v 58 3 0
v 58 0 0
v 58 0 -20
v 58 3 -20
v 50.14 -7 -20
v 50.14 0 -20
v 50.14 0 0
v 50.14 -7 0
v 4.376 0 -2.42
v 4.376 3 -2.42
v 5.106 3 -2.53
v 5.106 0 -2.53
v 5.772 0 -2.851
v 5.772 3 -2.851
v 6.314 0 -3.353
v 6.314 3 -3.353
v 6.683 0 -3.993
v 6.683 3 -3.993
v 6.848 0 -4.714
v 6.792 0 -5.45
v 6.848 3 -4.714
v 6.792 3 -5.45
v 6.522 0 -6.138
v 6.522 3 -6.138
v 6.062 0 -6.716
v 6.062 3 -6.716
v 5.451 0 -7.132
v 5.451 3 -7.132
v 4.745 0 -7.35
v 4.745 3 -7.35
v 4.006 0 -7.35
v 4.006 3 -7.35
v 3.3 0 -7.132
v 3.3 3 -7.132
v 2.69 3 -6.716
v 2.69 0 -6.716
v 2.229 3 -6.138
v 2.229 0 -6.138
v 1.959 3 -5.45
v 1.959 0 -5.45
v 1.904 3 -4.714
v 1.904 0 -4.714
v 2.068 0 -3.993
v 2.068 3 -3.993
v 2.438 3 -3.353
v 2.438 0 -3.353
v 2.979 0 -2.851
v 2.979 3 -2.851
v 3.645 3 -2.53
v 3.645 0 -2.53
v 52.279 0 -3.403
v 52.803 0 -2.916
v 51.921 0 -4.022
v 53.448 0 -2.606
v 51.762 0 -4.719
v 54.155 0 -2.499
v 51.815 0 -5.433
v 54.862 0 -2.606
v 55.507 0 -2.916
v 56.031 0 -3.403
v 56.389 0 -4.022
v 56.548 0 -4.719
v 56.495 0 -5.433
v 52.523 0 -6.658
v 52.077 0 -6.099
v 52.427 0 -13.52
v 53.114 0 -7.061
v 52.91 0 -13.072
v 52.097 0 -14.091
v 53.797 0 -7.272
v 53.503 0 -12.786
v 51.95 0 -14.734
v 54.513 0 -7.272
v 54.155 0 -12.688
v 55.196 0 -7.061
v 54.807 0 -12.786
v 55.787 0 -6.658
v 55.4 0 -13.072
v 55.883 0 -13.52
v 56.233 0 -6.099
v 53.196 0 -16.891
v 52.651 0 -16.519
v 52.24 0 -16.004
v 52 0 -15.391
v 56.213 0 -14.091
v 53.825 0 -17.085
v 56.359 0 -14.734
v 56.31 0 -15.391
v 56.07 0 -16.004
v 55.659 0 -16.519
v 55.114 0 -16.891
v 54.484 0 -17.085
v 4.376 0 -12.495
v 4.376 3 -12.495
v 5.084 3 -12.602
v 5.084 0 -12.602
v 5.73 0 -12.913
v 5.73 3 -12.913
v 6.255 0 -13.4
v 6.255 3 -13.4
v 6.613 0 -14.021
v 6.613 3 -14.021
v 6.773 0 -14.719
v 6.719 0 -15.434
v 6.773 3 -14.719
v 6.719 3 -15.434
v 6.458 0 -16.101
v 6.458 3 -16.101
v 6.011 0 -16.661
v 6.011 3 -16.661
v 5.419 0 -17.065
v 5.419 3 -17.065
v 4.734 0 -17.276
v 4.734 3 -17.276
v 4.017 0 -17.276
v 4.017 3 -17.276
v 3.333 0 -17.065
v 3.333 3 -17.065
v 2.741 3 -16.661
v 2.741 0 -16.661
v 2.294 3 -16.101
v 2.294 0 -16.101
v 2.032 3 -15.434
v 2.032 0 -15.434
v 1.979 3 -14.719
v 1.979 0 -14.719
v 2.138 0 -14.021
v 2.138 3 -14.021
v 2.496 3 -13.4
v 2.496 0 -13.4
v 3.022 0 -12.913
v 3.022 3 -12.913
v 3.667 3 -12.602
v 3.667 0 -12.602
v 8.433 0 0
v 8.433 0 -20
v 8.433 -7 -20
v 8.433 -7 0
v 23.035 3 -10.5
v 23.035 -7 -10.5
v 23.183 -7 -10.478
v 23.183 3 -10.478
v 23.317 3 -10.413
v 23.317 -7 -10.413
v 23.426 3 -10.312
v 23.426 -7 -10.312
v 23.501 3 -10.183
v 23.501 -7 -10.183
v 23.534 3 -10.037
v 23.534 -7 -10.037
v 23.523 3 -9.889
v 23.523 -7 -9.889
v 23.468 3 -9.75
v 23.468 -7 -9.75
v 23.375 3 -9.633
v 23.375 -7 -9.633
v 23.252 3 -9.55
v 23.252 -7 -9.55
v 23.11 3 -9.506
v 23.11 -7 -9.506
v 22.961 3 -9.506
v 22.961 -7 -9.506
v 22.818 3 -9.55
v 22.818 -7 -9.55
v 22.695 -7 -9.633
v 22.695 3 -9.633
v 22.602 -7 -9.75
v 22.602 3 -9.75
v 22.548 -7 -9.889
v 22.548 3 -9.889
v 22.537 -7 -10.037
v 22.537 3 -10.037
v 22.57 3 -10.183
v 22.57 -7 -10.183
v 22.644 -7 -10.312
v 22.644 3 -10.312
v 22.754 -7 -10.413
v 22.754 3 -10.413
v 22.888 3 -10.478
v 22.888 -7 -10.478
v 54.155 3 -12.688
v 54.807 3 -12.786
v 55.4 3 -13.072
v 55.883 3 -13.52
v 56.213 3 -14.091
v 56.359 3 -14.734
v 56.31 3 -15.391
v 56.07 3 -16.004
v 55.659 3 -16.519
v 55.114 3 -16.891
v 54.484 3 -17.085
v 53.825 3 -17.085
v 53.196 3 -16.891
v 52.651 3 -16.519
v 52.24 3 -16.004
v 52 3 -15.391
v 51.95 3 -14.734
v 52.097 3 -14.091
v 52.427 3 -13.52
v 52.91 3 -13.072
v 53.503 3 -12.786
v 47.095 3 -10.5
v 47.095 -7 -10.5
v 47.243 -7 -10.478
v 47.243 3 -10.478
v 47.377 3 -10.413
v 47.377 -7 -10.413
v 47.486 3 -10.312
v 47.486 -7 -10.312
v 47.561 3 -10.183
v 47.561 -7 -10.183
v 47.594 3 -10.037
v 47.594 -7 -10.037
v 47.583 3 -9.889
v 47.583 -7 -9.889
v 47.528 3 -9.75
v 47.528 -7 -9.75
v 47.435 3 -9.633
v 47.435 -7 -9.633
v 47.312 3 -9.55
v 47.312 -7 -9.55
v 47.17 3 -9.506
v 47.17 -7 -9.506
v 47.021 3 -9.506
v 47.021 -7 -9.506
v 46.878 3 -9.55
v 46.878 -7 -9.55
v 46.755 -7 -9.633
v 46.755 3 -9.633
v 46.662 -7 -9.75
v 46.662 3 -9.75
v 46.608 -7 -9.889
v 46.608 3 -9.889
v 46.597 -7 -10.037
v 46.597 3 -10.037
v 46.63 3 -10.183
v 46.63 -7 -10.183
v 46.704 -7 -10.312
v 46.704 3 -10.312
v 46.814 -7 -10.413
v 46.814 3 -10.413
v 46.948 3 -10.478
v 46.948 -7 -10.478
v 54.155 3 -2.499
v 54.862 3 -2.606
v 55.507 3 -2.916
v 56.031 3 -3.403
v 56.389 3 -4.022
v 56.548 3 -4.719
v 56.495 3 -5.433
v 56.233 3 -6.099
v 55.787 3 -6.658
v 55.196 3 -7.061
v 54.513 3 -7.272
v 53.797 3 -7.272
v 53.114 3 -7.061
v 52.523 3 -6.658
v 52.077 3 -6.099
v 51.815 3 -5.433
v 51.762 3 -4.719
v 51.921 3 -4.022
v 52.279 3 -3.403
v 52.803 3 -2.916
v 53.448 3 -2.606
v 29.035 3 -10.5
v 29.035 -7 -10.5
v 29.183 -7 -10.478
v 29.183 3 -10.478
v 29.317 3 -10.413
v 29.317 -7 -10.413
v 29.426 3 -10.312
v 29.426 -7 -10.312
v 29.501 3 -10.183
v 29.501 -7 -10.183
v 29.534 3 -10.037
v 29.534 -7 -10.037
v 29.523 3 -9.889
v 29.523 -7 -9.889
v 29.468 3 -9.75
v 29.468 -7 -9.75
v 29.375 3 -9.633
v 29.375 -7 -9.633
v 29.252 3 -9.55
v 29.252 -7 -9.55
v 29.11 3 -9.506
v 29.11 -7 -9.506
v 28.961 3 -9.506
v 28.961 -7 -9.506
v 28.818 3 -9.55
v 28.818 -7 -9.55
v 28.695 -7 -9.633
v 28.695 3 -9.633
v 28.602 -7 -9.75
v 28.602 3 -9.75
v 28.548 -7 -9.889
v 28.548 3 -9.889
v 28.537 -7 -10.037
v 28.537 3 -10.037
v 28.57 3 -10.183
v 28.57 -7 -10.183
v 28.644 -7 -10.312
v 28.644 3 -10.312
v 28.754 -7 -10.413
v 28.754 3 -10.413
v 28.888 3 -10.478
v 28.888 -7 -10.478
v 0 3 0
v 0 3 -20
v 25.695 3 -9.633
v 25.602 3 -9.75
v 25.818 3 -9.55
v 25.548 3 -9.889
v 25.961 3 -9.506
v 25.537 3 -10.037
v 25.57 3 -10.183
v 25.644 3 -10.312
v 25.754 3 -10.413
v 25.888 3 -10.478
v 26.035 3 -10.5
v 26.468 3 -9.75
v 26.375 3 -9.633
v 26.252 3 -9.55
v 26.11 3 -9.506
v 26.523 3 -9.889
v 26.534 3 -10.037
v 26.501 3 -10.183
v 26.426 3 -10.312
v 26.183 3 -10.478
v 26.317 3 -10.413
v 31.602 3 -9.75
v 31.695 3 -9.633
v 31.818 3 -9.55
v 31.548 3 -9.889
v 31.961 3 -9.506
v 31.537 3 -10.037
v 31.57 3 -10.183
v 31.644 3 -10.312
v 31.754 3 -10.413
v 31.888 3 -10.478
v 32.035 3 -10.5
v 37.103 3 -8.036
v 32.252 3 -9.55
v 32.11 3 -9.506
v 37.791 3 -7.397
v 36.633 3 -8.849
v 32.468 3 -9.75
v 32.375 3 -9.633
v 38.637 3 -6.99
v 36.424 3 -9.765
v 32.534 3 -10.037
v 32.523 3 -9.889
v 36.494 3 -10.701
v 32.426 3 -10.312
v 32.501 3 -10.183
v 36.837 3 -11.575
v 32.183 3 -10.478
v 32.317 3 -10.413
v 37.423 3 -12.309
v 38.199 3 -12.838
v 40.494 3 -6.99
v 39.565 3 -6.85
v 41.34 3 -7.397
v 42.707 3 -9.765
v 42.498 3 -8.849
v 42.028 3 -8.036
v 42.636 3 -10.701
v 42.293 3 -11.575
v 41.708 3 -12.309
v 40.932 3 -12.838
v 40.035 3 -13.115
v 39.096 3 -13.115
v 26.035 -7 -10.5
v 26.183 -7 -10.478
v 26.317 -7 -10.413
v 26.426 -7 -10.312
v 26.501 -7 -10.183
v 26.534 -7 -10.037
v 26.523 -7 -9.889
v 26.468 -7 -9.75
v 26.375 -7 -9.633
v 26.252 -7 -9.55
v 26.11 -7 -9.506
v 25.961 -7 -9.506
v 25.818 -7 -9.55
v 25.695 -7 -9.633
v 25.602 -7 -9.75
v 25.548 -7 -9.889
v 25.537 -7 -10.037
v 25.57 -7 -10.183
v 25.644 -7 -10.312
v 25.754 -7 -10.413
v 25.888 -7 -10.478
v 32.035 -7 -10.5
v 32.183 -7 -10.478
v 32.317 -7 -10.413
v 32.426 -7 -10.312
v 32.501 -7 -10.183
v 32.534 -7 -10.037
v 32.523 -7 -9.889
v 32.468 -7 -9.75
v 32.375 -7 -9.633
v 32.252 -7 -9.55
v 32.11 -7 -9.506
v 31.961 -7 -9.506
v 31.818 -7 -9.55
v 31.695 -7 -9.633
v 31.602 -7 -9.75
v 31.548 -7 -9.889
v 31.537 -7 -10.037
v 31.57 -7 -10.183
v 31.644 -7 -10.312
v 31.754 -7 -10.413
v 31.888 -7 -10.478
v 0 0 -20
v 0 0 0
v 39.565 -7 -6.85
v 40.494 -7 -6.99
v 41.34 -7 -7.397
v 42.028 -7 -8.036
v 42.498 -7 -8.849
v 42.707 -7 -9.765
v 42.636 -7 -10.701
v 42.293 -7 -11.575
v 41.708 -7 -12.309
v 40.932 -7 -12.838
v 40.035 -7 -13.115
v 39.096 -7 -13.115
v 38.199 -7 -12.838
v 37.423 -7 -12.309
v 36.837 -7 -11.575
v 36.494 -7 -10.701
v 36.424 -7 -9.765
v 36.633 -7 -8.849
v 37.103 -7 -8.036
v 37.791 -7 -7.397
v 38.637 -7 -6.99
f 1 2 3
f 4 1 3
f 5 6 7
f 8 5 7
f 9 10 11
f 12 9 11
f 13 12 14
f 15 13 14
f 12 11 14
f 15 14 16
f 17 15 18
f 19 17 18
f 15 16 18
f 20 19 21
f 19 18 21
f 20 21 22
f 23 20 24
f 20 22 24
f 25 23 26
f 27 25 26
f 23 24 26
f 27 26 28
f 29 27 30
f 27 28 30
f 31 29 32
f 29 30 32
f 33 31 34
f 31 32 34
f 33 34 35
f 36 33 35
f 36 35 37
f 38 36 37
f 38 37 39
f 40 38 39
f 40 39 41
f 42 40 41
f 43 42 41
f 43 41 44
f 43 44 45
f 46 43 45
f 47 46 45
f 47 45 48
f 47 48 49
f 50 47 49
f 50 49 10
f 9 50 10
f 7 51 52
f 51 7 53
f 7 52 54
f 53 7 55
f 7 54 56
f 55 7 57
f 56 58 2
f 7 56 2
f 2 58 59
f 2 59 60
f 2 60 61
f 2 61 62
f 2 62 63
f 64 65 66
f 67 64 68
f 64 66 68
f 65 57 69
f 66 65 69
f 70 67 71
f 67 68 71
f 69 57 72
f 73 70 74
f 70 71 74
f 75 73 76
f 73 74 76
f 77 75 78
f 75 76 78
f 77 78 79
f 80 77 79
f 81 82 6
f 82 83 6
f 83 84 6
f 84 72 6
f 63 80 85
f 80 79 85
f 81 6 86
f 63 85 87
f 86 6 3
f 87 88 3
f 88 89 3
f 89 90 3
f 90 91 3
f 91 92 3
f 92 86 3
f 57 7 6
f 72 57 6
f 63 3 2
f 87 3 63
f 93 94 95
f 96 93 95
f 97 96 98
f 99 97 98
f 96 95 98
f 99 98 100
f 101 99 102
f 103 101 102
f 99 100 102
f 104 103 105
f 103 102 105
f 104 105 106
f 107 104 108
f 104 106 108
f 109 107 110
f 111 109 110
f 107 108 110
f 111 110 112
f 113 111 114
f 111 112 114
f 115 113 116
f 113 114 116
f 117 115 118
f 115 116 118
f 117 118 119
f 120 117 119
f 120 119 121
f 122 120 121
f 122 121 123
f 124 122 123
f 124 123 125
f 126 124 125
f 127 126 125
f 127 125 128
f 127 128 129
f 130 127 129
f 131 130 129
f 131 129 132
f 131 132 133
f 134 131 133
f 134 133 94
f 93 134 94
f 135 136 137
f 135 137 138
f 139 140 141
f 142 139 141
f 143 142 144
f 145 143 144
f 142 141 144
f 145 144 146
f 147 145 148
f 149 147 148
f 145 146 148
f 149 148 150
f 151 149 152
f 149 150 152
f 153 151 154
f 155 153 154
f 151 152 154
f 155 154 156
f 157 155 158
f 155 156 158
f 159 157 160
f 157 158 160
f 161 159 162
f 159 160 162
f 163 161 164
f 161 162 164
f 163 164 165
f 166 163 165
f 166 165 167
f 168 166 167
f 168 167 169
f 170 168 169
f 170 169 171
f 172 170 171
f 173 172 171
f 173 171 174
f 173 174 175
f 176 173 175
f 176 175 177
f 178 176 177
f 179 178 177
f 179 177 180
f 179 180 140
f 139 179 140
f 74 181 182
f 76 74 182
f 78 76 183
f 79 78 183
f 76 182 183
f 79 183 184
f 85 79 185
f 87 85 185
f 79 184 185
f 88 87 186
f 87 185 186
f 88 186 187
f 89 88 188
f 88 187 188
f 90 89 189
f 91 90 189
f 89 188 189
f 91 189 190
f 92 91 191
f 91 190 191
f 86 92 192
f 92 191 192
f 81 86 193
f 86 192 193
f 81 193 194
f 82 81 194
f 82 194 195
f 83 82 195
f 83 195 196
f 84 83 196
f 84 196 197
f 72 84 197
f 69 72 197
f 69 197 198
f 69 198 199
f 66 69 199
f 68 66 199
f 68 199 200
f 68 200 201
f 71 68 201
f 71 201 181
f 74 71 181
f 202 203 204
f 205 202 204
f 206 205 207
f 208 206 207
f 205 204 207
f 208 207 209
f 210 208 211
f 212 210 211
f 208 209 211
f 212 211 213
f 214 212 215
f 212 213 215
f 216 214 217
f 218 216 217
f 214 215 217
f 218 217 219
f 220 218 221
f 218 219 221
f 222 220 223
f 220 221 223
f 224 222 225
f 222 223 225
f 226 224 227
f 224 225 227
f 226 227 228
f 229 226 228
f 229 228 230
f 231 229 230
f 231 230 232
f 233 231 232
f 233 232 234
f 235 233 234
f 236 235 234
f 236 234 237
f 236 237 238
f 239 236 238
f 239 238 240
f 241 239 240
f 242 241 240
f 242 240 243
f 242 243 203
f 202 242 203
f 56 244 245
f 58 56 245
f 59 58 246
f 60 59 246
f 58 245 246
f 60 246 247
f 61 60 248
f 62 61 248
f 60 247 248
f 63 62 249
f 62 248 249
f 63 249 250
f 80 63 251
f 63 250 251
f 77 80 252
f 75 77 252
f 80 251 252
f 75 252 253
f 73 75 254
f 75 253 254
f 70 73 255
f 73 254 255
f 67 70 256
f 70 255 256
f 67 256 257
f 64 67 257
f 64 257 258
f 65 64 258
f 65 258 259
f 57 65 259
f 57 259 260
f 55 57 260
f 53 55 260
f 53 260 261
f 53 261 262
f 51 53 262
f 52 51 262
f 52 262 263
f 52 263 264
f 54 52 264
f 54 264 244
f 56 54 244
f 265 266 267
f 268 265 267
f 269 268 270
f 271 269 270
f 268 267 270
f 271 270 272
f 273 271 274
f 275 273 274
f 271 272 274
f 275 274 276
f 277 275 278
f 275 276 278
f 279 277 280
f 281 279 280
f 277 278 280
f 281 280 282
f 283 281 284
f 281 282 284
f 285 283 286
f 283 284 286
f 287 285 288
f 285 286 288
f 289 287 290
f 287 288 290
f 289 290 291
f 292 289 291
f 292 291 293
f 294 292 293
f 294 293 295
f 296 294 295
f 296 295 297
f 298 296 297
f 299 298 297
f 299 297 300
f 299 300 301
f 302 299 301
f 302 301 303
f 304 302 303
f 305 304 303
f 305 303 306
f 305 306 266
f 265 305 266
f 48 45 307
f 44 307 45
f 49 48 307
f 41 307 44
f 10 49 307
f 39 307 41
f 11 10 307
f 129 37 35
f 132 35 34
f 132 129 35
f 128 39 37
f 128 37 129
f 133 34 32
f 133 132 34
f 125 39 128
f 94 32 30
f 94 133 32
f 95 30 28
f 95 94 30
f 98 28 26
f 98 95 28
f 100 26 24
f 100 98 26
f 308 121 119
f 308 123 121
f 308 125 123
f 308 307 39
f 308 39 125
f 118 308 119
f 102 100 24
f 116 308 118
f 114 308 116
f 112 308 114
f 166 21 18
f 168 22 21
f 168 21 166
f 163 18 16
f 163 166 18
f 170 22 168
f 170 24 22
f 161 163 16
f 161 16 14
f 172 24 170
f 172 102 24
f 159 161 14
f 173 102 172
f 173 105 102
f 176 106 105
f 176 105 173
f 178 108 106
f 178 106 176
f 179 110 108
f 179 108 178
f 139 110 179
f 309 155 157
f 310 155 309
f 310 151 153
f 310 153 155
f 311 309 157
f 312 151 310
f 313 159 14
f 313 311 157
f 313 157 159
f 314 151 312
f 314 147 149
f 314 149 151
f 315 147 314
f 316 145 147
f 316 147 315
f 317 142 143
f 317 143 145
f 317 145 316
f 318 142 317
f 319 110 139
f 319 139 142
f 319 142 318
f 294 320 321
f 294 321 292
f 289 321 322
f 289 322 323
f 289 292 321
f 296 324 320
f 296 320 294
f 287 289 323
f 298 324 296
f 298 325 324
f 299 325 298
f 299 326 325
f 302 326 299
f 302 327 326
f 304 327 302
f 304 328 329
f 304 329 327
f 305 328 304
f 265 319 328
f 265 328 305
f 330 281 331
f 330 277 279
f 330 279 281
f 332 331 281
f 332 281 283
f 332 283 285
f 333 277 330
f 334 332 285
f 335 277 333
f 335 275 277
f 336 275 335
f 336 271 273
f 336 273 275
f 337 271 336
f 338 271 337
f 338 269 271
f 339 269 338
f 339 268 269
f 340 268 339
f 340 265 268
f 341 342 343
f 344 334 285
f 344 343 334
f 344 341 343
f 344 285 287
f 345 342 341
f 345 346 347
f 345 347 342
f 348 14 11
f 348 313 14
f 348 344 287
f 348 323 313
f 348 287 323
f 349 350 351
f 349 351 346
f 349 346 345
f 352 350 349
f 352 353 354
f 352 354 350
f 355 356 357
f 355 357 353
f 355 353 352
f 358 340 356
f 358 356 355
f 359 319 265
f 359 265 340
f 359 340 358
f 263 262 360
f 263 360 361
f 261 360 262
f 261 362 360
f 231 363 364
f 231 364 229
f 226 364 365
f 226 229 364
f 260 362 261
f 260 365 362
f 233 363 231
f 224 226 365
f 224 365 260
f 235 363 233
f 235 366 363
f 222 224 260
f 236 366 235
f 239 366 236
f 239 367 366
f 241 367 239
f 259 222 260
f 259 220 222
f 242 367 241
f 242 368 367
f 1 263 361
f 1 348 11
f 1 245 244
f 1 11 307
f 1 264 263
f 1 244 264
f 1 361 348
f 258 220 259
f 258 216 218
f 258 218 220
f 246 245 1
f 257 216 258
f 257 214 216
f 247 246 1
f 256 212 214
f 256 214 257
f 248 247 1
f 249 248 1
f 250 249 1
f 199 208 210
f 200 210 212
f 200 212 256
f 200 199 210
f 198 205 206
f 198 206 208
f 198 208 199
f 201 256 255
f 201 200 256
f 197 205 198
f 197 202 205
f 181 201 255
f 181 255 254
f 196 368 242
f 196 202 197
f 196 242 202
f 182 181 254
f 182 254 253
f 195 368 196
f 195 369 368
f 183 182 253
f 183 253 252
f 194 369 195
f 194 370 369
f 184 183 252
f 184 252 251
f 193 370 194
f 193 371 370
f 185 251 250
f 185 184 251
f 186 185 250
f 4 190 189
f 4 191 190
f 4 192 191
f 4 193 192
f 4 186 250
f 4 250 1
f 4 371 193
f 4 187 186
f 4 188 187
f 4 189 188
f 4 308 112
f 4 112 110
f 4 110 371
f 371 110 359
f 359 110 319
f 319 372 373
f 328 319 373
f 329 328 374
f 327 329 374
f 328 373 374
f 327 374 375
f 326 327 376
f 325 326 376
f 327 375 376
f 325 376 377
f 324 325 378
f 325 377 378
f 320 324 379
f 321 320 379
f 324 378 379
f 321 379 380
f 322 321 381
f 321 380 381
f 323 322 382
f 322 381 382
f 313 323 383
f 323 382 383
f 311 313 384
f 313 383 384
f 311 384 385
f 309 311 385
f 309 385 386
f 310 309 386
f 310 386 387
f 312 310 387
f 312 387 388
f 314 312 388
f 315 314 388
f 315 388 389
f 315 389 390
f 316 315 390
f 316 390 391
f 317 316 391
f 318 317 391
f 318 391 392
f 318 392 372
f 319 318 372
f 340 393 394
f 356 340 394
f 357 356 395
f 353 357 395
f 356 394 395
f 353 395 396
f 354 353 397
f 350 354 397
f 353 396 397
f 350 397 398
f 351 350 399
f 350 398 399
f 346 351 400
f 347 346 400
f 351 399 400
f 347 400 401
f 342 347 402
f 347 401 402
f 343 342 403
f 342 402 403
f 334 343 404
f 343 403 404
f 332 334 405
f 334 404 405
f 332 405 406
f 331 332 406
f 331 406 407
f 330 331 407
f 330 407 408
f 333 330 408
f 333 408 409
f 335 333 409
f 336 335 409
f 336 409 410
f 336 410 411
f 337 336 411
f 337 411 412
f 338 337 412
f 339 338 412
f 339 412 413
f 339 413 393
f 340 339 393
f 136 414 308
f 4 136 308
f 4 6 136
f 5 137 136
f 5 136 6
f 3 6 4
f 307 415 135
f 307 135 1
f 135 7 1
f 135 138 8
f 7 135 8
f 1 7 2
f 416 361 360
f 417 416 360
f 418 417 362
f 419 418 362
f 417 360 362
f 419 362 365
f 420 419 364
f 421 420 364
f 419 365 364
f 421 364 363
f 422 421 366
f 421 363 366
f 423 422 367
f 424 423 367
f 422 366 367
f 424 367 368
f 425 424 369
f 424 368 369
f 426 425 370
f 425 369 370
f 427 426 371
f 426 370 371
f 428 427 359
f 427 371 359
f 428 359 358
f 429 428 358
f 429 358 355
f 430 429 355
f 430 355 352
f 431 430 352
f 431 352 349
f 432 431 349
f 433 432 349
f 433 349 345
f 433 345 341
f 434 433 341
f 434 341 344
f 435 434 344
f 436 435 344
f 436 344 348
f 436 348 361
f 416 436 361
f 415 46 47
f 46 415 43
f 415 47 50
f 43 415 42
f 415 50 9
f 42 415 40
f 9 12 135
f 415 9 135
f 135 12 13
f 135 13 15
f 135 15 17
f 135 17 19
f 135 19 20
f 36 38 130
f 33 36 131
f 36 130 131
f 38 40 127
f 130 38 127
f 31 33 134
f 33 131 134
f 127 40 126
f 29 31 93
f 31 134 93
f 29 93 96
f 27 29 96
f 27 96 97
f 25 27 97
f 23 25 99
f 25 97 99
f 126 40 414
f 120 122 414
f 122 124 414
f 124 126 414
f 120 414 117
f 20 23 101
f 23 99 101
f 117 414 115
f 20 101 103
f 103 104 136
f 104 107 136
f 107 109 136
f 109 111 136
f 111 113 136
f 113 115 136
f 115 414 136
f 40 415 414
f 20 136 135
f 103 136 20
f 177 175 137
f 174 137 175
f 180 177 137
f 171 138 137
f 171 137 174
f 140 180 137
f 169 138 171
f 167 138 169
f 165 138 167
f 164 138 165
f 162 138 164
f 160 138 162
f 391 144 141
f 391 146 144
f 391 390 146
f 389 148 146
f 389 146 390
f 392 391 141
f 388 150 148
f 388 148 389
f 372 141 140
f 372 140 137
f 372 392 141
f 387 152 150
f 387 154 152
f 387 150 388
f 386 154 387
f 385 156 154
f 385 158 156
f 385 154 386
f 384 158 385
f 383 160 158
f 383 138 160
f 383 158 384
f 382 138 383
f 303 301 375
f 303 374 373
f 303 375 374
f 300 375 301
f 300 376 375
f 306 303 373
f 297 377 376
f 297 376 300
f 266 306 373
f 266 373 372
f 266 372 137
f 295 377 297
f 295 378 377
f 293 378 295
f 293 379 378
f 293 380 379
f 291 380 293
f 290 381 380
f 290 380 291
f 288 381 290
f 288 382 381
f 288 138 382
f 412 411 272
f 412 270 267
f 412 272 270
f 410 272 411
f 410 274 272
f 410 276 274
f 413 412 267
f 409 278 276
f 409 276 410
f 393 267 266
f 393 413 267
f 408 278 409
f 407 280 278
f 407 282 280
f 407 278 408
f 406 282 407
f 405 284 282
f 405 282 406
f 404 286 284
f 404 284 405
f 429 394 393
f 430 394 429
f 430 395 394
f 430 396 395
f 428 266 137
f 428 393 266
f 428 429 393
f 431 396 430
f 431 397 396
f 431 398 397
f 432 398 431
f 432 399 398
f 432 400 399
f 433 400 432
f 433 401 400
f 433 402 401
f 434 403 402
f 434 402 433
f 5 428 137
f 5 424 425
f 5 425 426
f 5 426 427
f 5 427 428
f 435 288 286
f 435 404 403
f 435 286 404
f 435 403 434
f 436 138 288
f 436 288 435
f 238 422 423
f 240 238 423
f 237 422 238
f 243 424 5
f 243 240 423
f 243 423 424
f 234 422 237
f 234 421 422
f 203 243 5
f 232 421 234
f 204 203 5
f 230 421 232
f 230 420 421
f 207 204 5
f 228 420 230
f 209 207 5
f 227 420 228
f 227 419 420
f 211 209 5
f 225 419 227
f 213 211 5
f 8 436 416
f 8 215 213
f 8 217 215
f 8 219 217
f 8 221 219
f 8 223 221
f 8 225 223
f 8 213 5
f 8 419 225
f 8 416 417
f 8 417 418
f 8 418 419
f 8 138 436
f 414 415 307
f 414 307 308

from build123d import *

# Parameters (mm, degrees)
SKETCH1_W           = 58
SKETCH1_H           = 20
BOSS_EXTRUDE1_DEPTH = 3
SKETCH2_R           = 2.210718461
SKETCH2_R_2         = 2.399764385
SKETCH2_R_3         = 2.478849081
SKETCH2_R_4         = 2.403854655
CUT_EXTRUDE1_DEPTH  = 10
SKETCH3_W           = 41.706821958
SKETCH3_H           = 20
BOSS_EXTRUDE2_DEPTH = 7
SKETCH4_R           = 3.15
CUT_EXTRUDE2_DEPTH  = 20
SKETCH5_R           = 0.5
CUT_EXTRUDE3_DEPTH  = 22


with BuildPart() as part:
    # Sketch1 → Boss-Extrude1 (new body)
    with BuildSketch(Plane(origin=(0, 0, 0), x_dir=(1, 0, 0), z_dir=(0, 1, 0))):
        with Locations((29, 10)):
            Rectangle(SKETCH1_W, SKETCH1_H)
    extrude(amount=BOSS_EXTRUDE1_DEPTH)

    # Sketch2 → Cut-Extrude1 (cut)
    with BuildSketch(Plane(origin=(0, 3, 0), x_dir=(1, 0, 0), z_dir=(0, 1, 0))):
        with Locations(Location((54.154962959, 14.898762514, 0), (0, 0, 270))):
            Circle(SKETCH2_R)
        with Locations(Location((54.154962959, 4.898762514, 0), (0, 0, 270))):
            Circle(SKETCH2_R_2)
        with Locations(Location((4.375736357, 4.898762514, 0), (0, 0, 270))):
            Circle(SKETCH2_R_3)
        with Locations(Location((4.375736357, 14.898762514, 0), (0, 0, 270))):
            Circle(SKETCH2_R_4)
    extrude(amount=-CUT_EXTRUDE1_DEPTH, mode=Mode.SUBTRACT)

    # Sketch3 → Boss-Extrude2 (add)
    with BuildSketch(Plane.XZ):
        with Locations((29.286245635, -10)):
            Rectangle(SKETCH3_W, SKETCH3_H)
    extrude(amount=BOSS_EXTRUDE2_DEPTH)

    # Sketch4 → Cut-Extrude2 (cut)
    with BuildSketch(Plane(origin=(0, 3, 0), x_dir=(1, 0, 0), z_dir=(0, 1, 0))):
        with Locations(Location((39.565349658, 10, 0), (0, 0, 270))):
            Circle(SKETCH4_R)
    extrude(amount=-CUT_EXTRUDE2_DEPTH, mode=Mode.SUBTRACT)

    # Sketch5 → Cut-Extrude3 (cut)
    with BuildSketch(Plane.XZ.offset(7)):
        with Locations(Location((26.035349658, -10, 0), (0, 0, 270))):
            Circle(SKETCH5_R)
        with Locations(Location((29.035349658, -10, 0), (0, 0, 270))):
            Circle(SKETCH5_R)
        with Locations(Location((23.035349658, -10, 0), (0, 0, 270))):
            Circle(SKETCH5_R)
        with Locations(Location((32.035349658, -10, 0), (0, 0, 270))):
            Circle(SKETCH5_R)
        with Locations(Location((47.095349658, -10, 0), (0, 0, 270))):
            Circle(SKETCH5_R)
    extrude(amount=-CUT_EXTRUDE3_DEPTH, mode=Mode.SUBTRACT)


solid = part.part
